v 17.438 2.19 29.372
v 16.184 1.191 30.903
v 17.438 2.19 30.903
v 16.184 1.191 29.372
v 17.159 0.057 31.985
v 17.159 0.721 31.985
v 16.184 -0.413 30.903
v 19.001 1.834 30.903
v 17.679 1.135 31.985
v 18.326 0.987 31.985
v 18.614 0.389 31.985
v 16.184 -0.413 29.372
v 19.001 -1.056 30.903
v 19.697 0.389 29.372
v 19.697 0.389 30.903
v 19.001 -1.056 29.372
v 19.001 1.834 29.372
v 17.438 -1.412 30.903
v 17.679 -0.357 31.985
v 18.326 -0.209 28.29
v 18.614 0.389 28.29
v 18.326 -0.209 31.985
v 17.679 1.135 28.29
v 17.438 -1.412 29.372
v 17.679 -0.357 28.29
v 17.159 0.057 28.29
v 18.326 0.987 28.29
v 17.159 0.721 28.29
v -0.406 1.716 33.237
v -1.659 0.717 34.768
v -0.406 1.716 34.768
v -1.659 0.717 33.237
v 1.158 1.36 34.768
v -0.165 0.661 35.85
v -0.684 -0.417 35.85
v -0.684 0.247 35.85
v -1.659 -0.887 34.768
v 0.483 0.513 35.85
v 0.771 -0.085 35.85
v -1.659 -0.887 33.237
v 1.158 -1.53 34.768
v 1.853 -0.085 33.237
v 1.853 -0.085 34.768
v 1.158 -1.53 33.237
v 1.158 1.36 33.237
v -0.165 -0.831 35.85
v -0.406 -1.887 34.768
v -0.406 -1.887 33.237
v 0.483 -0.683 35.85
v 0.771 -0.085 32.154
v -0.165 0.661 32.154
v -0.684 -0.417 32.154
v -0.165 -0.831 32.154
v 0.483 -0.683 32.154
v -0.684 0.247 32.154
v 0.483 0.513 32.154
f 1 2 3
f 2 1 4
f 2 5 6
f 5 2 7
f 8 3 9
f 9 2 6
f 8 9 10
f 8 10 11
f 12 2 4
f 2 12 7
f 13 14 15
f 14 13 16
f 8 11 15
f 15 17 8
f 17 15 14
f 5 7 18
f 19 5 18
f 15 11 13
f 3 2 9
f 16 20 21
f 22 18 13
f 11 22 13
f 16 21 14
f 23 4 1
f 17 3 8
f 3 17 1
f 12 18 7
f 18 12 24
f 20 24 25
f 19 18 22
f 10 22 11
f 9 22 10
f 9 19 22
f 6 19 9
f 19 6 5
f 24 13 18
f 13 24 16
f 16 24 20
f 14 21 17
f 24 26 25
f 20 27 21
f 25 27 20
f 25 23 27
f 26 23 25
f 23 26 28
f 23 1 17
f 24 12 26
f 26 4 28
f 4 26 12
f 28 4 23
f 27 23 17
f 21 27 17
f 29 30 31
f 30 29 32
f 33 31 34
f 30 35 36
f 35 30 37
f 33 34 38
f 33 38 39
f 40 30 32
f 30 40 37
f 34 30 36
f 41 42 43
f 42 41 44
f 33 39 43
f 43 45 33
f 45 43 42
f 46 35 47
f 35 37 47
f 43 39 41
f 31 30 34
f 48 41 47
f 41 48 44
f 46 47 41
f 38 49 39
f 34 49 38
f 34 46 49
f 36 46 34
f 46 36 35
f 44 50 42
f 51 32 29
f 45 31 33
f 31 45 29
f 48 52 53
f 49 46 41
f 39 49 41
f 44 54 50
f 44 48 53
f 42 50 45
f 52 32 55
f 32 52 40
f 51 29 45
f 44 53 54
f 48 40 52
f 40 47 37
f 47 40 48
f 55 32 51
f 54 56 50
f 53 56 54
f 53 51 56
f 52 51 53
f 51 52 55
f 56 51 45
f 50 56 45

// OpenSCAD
t1=[1,1,1];
r1=[1,29,0];
s1=[1,1,1];

p0=[0,0,34];
translate(p0)sphere();
p1=transform(p0,t1,r1,s1);
p2=invtransform(p1,t1,r1,s1);
echo(1/r1);
translate(p1)sphere(2);
translate(p2)sphere(2);

function transform(p,T,R,S)=
 t([p.x, p.y, p.z, 1]*m_translate(T)*m_rotate(R)*m_scale(S));
function invtransform(p,T,R,S)=
 t([p.x, p.y, p.z,1]*m_scale(1/S)*m_rotate(R*-1)*m_translate(T*-1));
 
function t(v) = [v.x, v.y, v.z];
function m_rotate(v) =  [ [1,  0,         0,        0],
                          [0,  cos(v.x),  sin(v.x), 0],
                          [0, -sin(v.x),  cos(v.x), 0],
                          [0,  0,         0,        1] ]
                      * [ [ cos(v.y), 0,  -sin(v.y), 0],
                          [0,         1,  0,        0],
                          [ sin(v.y), 0,  cos(v.y), 0],
                          [0,         0,  0,        1] ]
                      * [ [ cos(v.z),  sin(v.z), 0, 0],
                          [-sin(v.z),  cos(v.z), 0, 0],
                          [ 0,         0,        1, 0],
                          [ 0,         0,        0, 1] ];
function m_translate(v) = [ [1, 0, 0, 0],
                            [0, 1, 0, 0],
                            [0, 0, 1, 0],
                            [v.x, v.y, v.z, 1  ] ];
function m_scale(v) =    [ [v.x, 0, 0, 0],
                            [0, v.y, 0, 0],
                            [0, 0, v.z, 0],
                            [0, 0, 0, 1 ] ];
